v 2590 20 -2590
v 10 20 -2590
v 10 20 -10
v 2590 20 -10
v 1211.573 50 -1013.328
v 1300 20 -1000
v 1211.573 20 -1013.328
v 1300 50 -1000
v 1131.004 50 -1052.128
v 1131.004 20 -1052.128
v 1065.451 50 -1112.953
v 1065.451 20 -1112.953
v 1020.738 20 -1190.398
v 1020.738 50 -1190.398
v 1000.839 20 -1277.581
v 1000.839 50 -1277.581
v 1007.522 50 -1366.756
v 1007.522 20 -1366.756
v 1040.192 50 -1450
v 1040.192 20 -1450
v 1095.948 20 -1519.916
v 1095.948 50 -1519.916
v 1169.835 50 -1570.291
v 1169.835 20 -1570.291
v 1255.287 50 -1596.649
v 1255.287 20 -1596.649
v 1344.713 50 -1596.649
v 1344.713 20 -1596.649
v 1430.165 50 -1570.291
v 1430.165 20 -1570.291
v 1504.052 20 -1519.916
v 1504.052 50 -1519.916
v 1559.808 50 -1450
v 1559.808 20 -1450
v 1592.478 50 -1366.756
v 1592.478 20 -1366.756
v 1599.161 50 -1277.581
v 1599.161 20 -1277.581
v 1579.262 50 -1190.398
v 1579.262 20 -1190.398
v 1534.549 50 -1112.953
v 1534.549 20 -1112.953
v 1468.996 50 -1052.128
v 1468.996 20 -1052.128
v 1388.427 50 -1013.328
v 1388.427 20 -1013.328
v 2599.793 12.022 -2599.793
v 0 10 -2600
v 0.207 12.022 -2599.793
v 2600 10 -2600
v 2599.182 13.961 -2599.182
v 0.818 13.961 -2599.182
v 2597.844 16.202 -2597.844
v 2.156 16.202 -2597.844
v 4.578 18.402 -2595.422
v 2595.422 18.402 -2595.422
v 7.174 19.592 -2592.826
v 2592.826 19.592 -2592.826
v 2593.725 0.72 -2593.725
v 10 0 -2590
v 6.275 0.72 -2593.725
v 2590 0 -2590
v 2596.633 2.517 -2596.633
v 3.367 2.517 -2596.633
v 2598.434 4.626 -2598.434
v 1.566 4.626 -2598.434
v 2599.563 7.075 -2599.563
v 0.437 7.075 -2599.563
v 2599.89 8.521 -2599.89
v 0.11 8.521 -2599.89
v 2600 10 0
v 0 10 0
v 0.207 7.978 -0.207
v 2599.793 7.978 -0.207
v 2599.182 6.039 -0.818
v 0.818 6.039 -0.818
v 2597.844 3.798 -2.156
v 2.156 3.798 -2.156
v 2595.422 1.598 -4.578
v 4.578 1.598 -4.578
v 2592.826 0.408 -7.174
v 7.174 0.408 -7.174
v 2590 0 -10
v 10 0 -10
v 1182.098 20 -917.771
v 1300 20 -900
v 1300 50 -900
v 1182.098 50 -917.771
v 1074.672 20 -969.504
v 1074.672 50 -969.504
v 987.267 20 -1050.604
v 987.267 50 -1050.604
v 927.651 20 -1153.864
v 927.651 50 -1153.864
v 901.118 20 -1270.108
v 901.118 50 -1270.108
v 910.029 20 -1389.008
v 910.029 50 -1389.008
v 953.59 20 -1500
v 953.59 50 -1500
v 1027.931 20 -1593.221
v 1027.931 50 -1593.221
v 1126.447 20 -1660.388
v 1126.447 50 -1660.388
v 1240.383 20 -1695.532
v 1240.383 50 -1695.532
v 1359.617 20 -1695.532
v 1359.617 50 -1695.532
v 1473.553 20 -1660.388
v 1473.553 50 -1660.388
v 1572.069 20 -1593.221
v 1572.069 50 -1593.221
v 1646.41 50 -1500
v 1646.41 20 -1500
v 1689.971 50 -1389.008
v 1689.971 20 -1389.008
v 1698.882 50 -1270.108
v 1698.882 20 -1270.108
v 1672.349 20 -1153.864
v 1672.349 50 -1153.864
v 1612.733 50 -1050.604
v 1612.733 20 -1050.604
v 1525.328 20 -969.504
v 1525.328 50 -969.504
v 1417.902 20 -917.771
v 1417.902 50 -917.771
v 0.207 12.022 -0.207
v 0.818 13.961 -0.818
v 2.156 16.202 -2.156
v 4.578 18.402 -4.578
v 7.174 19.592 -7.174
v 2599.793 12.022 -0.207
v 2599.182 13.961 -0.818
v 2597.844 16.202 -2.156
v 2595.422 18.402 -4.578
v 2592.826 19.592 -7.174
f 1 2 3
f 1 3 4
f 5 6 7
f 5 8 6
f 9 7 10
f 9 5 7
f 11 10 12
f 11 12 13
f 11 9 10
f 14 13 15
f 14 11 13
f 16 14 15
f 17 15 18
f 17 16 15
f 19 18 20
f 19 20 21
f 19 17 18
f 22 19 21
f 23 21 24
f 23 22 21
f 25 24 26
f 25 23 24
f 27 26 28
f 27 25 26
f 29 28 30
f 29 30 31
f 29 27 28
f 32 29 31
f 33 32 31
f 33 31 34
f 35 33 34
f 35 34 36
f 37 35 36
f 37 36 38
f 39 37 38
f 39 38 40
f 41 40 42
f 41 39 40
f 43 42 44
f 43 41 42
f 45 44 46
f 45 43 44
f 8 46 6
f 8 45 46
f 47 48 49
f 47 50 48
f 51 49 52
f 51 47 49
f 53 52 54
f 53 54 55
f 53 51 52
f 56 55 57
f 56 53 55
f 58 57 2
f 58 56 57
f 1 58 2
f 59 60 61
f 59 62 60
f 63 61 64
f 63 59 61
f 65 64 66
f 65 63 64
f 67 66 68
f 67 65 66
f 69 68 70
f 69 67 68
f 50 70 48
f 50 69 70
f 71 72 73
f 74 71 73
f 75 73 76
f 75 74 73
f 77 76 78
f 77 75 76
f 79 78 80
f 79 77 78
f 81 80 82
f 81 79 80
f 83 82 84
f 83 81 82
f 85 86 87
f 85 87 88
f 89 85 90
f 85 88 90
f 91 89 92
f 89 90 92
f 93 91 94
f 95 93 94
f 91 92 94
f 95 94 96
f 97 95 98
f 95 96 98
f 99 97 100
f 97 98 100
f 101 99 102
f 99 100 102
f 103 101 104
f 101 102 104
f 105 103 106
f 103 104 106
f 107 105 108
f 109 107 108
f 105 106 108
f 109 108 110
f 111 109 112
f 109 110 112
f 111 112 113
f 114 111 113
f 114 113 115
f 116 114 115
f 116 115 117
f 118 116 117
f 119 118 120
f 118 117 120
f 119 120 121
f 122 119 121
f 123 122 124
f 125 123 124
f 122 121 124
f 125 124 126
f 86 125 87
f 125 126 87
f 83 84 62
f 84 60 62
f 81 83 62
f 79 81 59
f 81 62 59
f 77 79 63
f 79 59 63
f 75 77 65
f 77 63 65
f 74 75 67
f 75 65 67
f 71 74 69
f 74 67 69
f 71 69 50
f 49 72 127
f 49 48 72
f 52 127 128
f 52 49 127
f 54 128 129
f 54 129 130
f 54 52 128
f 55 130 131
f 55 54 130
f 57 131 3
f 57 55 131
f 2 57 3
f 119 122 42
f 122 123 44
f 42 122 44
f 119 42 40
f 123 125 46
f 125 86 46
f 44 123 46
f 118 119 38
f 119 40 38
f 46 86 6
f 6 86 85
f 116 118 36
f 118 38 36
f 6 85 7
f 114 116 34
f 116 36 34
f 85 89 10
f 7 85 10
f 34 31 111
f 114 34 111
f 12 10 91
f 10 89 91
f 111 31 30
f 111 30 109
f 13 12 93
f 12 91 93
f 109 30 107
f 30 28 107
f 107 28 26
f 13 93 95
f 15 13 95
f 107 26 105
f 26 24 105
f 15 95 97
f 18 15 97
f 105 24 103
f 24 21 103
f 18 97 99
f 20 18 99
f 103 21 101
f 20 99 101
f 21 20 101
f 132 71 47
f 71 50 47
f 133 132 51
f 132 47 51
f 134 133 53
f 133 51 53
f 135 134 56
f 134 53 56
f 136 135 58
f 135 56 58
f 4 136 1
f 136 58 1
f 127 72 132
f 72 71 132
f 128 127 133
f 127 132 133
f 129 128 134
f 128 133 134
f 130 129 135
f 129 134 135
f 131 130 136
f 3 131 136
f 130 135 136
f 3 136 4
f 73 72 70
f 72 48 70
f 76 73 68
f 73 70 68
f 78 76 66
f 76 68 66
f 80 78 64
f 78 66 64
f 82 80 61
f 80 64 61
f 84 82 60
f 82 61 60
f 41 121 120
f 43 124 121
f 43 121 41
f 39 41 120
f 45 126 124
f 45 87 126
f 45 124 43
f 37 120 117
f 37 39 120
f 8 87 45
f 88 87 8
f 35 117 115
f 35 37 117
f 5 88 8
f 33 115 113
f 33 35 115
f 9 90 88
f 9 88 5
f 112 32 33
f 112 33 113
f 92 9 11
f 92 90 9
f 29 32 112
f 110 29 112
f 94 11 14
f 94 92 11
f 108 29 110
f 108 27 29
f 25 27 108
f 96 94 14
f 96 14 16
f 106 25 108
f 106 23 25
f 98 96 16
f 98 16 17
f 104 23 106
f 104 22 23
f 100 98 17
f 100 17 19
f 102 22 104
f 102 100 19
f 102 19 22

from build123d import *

# Parameters (mm, degrees)
SKETCH1_W           = 2600
SKETCH1_H           = 2600
BOSS_EXTRUDE1_DEPTH = 20
FILLET1_R           = 10
FILLET2_R           = 10
SKETCH6_W           = 100
SKETCH6_H           = 30


with BuildPart() as part:
    # Sketch1 → Boss-Extrude1 (new body)
    with BuildSketch(Plane(origin=(0, 0, 0), x_dir=(1, 0, 0), z_dir=(0, 1, 0))):
        with Locations((1300, 1300)):
            Rectangle(SKETCH1_W, SKETCH1_H)
    extrude(amount=BOSS_EXTRUDE1_DEPTH)

    # Fillet1
    fillet1_edges = [part.edges().sort_by_distance(p)[0] for p in [
        (2600, 20, -1300),
        (1300, 20, -2600),
        (0, 20, -1300),
        (1300, 20, 0),
    ]]
    fillet(fillet1_edges, radius=FILLET1_R)

    # Fillet2
    fillet2_edges = [part.edges().sort_by_distance(p)[0] for p in [
        (1300, 0, 0),
        (2600, 0, -1300),
        (1300, 0, -2600),
        (0, 0, -1300),
    ]]
    fillet(fillet2_edges, radius=FILLET2_R - 0.0001)  # a hair under: the kernel refuses the full size


with BuildPart() as body_2:
    # Sketch6 → Revolve1 (revolve)
    with BuildSketch(Plane(origin=(0, 0, -1300), x_dir=(-1, 0, 0), z_dir=(0, 0, -1)), mode=Mode.PRIVATE) as revolve1_sk:
        with Locations((-950, 35)):
            Rectangle(SKETCH6_W, SKETCH6_H)
    revolve(revolve1_sk.sketch.rotate(Axis((1300, 325.555450853, -1300), (0, -1, 0)), 270), axis=Axis((1300, 325.555450853, -1300), (0, -1, 0)))


solid = Compound([part.part, body_2.part])
